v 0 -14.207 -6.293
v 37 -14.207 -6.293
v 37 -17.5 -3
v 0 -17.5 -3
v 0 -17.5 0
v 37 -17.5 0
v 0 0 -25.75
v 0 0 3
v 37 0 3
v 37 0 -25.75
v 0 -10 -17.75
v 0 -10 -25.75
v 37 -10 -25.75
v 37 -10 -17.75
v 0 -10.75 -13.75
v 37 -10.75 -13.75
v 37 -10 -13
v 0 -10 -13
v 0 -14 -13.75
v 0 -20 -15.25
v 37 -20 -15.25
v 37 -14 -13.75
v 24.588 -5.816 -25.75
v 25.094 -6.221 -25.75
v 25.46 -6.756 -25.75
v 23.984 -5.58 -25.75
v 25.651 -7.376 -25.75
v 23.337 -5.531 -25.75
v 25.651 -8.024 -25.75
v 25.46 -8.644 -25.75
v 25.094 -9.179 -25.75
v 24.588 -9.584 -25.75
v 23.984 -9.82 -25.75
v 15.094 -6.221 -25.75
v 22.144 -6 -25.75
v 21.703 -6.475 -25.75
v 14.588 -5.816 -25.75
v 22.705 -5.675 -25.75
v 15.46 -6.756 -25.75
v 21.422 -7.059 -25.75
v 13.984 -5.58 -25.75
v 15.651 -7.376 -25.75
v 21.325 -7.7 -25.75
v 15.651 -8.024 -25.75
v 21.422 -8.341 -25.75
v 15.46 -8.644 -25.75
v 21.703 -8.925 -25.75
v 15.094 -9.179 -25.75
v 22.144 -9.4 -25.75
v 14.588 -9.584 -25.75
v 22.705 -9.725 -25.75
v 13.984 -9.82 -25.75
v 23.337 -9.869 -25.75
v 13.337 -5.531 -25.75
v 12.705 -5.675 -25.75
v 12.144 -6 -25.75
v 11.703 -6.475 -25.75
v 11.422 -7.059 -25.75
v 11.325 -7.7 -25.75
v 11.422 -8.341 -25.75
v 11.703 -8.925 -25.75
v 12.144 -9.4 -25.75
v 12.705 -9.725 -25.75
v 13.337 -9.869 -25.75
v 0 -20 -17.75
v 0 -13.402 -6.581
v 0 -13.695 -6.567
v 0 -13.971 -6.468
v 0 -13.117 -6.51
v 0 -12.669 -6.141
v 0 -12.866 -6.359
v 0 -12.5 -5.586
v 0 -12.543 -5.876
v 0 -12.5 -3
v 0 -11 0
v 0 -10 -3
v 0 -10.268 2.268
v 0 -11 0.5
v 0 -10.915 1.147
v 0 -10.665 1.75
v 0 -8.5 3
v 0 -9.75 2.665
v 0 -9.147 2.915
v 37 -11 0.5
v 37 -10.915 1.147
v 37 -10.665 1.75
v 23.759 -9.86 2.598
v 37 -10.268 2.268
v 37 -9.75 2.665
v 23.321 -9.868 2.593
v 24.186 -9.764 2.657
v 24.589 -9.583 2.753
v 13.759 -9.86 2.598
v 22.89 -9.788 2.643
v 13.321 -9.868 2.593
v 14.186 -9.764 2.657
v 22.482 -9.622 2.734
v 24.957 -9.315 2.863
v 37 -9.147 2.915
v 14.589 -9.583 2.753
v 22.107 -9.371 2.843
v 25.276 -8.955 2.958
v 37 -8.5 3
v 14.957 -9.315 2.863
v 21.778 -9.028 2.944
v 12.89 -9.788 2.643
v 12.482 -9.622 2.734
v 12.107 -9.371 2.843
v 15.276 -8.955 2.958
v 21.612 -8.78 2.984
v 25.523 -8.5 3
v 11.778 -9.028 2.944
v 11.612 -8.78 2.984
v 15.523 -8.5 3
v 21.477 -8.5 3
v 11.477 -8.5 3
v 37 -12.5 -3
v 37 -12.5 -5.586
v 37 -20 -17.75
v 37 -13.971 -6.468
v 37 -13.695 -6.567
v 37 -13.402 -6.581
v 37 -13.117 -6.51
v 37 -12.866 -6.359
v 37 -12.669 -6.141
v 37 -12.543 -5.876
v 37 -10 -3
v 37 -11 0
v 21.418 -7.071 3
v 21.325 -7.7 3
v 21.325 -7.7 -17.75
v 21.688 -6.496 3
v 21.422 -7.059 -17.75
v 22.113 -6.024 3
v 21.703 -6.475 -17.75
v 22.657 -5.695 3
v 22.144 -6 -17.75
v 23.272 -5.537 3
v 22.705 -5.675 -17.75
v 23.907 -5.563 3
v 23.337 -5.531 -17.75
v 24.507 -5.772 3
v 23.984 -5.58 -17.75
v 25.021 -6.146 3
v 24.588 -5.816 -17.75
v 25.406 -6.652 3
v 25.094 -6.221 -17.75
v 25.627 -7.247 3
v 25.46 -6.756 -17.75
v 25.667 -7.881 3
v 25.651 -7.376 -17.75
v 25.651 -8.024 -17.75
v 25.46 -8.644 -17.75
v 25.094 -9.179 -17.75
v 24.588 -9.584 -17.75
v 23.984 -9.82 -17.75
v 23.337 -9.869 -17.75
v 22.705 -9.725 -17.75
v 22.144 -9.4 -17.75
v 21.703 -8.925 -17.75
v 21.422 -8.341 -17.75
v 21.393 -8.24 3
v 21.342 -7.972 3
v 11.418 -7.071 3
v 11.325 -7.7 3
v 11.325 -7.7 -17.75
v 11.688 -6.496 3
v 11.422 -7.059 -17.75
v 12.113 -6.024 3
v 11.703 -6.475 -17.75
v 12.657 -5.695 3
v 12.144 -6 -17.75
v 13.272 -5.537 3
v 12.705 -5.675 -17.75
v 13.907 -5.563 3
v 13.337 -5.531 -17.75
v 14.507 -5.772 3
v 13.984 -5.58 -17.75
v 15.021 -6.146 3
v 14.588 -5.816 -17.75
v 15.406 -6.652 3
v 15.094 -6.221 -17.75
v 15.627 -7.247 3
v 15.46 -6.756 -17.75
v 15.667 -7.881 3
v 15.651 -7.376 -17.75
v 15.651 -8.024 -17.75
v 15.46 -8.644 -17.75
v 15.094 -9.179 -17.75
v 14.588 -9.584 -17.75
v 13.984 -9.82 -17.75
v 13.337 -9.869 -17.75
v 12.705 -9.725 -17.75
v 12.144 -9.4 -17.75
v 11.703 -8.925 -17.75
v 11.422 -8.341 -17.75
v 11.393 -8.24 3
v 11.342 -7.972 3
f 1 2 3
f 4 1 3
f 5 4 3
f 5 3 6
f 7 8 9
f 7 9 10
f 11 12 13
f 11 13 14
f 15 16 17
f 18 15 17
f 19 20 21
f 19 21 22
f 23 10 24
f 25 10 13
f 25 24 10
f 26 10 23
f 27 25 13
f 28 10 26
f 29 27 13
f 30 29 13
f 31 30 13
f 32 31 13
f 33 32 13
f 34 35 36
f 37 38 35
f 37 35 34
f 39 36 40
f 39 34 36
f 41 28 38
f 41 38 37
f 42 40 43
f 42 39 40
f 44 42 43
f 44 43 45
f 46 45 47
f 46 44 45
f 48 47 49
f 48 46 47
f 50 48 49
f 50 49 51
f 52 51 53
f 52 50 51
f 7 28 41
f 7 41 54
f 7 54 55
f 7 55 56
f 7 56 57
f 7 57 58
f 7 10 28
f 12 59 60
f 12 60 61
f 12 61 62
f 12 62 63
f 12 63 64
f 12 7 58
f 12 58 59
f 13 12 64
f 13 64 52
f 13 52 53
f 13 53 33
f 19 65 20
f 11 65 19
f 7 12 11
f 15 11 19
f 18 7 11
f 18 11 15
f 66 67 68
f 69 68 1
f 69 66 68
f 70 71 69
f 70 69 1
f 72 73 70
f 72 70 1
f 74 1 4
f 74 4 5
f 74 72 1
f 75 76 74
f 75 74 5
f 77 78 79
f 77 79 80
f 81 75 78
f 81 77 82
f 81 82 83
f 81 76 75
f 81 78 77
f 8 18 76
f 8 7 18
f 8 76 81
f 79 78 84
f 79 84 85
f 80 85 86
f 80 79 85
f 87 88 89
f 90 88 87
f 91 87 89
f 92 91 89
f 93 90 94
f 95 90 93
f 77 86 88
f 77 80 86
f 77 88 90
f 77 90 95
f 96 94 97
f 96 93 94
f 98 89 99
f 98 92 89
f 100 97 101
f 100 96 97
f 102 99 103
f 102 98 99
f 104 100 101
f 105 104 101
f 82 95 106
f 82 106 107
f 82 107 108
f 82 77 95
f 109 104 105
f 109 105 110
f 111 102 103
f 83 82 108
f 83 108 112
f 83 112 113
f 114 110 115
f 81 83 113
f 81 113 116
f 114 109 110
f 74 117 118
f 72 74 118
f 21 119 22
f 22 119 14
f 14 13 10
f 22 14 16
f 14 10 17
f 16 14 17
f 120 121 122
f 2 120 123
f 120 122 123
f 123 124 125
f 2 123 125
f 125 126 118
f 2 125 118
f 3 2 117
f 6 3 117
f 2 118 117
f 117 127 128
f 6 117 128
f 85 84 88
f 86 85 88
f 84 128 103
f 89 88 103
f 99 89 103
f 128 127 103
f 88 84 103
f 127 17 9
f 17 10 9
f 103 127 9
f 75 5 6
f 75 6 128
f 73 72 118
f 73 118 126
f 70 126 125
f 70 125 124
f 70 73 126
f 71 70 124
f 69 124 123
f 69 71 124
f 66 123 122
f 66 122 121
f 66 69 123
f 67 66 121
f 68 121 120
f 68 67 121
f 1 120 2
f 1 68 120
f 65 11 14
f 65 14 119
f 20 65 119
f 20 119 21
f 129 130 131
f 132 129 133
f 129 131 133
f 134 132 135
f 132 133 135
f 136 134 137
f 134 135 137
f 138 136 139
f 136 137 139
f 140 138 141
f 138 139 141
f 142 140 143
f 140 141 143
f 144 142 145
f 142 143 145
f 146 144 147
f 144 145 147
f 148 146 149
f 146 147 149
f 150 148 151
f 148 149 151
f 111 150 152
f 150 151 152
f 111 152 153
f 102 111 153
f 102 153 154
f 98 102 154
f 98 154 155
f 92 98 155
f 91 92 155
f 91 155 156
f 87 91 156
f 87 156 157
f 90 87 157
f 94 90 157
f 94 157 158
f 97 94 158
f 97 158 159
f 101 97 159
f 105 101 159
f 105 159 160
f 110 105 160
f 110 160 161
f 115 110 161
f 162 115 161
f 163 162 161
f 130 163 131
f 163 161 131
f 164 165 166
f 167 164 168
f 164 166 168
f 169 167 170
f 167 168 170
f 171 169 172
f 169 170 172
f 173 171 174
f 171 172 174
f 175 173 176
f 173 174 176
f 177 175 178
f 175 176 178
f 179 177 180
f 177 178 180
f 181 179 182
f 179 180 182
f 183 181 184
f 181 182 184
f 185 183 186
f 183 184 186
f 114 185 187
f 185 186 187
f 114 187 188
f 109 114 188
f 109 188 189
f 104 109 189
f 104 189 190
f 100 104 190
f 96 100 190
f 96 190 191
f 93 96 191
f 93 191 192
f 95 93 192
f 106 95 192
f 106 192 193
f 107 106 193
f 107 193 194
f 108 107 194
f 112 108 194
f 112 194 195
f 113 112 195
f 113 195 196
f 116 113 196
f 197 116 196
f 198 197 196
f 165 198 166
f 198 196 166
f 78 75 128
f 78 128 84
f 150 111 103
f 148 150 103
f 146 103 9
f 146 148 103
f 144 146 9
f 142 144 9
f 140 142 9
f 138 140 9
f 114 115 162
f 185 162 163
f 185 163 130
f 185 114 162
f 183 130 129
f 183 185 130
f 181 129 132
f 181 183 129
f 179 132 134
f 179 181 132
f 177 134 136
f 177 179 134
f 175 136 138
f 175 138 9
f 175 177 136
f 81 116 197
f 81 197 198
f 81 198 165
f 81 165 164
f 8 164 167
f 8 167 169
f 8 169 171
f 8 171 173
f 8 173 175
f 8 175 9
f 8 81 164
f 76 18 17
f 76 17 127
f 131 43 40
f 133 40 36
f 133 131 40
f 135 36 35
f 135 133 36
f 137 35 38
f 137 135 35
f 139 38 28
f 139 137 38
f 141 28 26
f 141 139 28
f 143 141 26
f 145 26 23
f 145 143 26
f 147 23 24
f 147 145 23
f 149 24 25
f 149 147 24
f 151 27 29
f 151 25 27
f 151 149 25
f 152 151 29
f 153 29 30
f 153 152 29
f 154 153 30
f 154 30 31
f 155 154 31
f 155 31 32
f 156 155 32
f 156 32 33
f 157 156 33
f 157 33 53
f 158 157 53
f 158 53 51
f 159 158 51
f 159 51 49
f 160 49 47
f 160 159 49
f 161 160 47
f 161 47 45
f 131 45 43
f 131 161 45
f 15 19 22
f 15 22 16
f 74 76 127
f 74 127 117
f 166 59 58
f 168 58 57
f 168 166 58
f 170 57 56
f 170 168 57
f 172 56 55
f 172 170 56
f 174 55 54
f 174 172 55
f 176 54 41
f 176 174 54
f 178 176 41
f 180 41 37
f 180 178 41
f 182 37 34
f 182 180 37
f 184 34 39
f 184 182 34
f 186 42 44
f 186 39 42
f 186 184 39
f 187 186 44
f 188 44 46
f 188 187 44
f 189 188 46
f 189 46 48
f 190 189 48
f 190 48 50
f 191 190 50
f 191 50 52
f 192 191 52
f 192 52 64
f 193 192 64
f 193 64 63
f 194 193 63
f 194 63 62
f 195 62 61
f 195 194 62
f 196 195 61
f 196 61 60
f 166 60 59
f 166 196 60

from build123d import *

# Parameters (mm, degrees)
BOSS_EXTRUDE1_DEPTH     = 37
SKETCH3_R               = 2.175
CUT_EXTRUDE1_DEPTH      = 9
CUT_EXTRUDE1_DEPTH_BACK = 21.75


with BuildPart() as part:
    # Sketch2 → Boss-Extrude1 (new body)
    with BuildSketch(Plane(origin=(0, 0, 0), x_dir=(0, 0, -1), z_dir=(1, 0, 0))):
        with BuildLine():
            Line((0, 0), (17.75, 0))
            Line((17.75, 0), (25.75, 0))
            Line((25.75, 0), (25.75, -10))
            Line((25.75, -10), (17.75, -10))
            Line((17.75, -10), (17.75, -20))
            Line((17.75, -20), (15.25, -20))
            Line((15.25, -20), (13.75, -14))
            Line((13.75, -14), (13.75, -10.75))
            Line((13.75, -10.75), (13, -10))
            Line((13, -10), (3, -10))
            Line((3, -10), (3, -12.5))
            Line((3, -12.5), (5.585786438, -12.5))
            ThreePointArc((5.585786438, -12.5), (6.50966597, -13.117316568), (6.292893219, -14.207106781))
            Line((6.292893219, -14.207106781), (3, -17.5))
            Line((3, -17.5), (0, -17.5))
            Line((0, -17.5), (0, -11))
            Line((0, -11), (-0.5, -11))
            ThreePointArc((-0.5, -11), (-2.267766953, -10.267766953), (-3, -8.5))
            Line((-3, -8.5), (-3, 0))
            Line((-3, 0), (0, 0))
        make_face()
    extrude(amount=BOSS_EXTRUDE1_DEPTH)

    # Sketch3 → Cut-Extrude1 (cut, two sides)
    with BuildSketch(Plane(origin=(0, 0, -17.75), x_dir=(-1, 0, 0), z_dir=(0, 0, -1))) as cut_extrude1_sk:
        with Locations((-23.5, -7.7)):
            Circle(SKETCH3_R)
        with Locations((-13.5, -7.7)):
            Circle(SKETCH3_R)
    extrude(amount=CUT_EXTRUDE1_DEPTH, mode=Mode.SUBTRACT)
    extrude(cut_extrude1_sk.sketch, amount=-CUT_EXTRUDE1_DEPTH_BACK, mode=Mode.SUBTRACT)


solid = part.part
